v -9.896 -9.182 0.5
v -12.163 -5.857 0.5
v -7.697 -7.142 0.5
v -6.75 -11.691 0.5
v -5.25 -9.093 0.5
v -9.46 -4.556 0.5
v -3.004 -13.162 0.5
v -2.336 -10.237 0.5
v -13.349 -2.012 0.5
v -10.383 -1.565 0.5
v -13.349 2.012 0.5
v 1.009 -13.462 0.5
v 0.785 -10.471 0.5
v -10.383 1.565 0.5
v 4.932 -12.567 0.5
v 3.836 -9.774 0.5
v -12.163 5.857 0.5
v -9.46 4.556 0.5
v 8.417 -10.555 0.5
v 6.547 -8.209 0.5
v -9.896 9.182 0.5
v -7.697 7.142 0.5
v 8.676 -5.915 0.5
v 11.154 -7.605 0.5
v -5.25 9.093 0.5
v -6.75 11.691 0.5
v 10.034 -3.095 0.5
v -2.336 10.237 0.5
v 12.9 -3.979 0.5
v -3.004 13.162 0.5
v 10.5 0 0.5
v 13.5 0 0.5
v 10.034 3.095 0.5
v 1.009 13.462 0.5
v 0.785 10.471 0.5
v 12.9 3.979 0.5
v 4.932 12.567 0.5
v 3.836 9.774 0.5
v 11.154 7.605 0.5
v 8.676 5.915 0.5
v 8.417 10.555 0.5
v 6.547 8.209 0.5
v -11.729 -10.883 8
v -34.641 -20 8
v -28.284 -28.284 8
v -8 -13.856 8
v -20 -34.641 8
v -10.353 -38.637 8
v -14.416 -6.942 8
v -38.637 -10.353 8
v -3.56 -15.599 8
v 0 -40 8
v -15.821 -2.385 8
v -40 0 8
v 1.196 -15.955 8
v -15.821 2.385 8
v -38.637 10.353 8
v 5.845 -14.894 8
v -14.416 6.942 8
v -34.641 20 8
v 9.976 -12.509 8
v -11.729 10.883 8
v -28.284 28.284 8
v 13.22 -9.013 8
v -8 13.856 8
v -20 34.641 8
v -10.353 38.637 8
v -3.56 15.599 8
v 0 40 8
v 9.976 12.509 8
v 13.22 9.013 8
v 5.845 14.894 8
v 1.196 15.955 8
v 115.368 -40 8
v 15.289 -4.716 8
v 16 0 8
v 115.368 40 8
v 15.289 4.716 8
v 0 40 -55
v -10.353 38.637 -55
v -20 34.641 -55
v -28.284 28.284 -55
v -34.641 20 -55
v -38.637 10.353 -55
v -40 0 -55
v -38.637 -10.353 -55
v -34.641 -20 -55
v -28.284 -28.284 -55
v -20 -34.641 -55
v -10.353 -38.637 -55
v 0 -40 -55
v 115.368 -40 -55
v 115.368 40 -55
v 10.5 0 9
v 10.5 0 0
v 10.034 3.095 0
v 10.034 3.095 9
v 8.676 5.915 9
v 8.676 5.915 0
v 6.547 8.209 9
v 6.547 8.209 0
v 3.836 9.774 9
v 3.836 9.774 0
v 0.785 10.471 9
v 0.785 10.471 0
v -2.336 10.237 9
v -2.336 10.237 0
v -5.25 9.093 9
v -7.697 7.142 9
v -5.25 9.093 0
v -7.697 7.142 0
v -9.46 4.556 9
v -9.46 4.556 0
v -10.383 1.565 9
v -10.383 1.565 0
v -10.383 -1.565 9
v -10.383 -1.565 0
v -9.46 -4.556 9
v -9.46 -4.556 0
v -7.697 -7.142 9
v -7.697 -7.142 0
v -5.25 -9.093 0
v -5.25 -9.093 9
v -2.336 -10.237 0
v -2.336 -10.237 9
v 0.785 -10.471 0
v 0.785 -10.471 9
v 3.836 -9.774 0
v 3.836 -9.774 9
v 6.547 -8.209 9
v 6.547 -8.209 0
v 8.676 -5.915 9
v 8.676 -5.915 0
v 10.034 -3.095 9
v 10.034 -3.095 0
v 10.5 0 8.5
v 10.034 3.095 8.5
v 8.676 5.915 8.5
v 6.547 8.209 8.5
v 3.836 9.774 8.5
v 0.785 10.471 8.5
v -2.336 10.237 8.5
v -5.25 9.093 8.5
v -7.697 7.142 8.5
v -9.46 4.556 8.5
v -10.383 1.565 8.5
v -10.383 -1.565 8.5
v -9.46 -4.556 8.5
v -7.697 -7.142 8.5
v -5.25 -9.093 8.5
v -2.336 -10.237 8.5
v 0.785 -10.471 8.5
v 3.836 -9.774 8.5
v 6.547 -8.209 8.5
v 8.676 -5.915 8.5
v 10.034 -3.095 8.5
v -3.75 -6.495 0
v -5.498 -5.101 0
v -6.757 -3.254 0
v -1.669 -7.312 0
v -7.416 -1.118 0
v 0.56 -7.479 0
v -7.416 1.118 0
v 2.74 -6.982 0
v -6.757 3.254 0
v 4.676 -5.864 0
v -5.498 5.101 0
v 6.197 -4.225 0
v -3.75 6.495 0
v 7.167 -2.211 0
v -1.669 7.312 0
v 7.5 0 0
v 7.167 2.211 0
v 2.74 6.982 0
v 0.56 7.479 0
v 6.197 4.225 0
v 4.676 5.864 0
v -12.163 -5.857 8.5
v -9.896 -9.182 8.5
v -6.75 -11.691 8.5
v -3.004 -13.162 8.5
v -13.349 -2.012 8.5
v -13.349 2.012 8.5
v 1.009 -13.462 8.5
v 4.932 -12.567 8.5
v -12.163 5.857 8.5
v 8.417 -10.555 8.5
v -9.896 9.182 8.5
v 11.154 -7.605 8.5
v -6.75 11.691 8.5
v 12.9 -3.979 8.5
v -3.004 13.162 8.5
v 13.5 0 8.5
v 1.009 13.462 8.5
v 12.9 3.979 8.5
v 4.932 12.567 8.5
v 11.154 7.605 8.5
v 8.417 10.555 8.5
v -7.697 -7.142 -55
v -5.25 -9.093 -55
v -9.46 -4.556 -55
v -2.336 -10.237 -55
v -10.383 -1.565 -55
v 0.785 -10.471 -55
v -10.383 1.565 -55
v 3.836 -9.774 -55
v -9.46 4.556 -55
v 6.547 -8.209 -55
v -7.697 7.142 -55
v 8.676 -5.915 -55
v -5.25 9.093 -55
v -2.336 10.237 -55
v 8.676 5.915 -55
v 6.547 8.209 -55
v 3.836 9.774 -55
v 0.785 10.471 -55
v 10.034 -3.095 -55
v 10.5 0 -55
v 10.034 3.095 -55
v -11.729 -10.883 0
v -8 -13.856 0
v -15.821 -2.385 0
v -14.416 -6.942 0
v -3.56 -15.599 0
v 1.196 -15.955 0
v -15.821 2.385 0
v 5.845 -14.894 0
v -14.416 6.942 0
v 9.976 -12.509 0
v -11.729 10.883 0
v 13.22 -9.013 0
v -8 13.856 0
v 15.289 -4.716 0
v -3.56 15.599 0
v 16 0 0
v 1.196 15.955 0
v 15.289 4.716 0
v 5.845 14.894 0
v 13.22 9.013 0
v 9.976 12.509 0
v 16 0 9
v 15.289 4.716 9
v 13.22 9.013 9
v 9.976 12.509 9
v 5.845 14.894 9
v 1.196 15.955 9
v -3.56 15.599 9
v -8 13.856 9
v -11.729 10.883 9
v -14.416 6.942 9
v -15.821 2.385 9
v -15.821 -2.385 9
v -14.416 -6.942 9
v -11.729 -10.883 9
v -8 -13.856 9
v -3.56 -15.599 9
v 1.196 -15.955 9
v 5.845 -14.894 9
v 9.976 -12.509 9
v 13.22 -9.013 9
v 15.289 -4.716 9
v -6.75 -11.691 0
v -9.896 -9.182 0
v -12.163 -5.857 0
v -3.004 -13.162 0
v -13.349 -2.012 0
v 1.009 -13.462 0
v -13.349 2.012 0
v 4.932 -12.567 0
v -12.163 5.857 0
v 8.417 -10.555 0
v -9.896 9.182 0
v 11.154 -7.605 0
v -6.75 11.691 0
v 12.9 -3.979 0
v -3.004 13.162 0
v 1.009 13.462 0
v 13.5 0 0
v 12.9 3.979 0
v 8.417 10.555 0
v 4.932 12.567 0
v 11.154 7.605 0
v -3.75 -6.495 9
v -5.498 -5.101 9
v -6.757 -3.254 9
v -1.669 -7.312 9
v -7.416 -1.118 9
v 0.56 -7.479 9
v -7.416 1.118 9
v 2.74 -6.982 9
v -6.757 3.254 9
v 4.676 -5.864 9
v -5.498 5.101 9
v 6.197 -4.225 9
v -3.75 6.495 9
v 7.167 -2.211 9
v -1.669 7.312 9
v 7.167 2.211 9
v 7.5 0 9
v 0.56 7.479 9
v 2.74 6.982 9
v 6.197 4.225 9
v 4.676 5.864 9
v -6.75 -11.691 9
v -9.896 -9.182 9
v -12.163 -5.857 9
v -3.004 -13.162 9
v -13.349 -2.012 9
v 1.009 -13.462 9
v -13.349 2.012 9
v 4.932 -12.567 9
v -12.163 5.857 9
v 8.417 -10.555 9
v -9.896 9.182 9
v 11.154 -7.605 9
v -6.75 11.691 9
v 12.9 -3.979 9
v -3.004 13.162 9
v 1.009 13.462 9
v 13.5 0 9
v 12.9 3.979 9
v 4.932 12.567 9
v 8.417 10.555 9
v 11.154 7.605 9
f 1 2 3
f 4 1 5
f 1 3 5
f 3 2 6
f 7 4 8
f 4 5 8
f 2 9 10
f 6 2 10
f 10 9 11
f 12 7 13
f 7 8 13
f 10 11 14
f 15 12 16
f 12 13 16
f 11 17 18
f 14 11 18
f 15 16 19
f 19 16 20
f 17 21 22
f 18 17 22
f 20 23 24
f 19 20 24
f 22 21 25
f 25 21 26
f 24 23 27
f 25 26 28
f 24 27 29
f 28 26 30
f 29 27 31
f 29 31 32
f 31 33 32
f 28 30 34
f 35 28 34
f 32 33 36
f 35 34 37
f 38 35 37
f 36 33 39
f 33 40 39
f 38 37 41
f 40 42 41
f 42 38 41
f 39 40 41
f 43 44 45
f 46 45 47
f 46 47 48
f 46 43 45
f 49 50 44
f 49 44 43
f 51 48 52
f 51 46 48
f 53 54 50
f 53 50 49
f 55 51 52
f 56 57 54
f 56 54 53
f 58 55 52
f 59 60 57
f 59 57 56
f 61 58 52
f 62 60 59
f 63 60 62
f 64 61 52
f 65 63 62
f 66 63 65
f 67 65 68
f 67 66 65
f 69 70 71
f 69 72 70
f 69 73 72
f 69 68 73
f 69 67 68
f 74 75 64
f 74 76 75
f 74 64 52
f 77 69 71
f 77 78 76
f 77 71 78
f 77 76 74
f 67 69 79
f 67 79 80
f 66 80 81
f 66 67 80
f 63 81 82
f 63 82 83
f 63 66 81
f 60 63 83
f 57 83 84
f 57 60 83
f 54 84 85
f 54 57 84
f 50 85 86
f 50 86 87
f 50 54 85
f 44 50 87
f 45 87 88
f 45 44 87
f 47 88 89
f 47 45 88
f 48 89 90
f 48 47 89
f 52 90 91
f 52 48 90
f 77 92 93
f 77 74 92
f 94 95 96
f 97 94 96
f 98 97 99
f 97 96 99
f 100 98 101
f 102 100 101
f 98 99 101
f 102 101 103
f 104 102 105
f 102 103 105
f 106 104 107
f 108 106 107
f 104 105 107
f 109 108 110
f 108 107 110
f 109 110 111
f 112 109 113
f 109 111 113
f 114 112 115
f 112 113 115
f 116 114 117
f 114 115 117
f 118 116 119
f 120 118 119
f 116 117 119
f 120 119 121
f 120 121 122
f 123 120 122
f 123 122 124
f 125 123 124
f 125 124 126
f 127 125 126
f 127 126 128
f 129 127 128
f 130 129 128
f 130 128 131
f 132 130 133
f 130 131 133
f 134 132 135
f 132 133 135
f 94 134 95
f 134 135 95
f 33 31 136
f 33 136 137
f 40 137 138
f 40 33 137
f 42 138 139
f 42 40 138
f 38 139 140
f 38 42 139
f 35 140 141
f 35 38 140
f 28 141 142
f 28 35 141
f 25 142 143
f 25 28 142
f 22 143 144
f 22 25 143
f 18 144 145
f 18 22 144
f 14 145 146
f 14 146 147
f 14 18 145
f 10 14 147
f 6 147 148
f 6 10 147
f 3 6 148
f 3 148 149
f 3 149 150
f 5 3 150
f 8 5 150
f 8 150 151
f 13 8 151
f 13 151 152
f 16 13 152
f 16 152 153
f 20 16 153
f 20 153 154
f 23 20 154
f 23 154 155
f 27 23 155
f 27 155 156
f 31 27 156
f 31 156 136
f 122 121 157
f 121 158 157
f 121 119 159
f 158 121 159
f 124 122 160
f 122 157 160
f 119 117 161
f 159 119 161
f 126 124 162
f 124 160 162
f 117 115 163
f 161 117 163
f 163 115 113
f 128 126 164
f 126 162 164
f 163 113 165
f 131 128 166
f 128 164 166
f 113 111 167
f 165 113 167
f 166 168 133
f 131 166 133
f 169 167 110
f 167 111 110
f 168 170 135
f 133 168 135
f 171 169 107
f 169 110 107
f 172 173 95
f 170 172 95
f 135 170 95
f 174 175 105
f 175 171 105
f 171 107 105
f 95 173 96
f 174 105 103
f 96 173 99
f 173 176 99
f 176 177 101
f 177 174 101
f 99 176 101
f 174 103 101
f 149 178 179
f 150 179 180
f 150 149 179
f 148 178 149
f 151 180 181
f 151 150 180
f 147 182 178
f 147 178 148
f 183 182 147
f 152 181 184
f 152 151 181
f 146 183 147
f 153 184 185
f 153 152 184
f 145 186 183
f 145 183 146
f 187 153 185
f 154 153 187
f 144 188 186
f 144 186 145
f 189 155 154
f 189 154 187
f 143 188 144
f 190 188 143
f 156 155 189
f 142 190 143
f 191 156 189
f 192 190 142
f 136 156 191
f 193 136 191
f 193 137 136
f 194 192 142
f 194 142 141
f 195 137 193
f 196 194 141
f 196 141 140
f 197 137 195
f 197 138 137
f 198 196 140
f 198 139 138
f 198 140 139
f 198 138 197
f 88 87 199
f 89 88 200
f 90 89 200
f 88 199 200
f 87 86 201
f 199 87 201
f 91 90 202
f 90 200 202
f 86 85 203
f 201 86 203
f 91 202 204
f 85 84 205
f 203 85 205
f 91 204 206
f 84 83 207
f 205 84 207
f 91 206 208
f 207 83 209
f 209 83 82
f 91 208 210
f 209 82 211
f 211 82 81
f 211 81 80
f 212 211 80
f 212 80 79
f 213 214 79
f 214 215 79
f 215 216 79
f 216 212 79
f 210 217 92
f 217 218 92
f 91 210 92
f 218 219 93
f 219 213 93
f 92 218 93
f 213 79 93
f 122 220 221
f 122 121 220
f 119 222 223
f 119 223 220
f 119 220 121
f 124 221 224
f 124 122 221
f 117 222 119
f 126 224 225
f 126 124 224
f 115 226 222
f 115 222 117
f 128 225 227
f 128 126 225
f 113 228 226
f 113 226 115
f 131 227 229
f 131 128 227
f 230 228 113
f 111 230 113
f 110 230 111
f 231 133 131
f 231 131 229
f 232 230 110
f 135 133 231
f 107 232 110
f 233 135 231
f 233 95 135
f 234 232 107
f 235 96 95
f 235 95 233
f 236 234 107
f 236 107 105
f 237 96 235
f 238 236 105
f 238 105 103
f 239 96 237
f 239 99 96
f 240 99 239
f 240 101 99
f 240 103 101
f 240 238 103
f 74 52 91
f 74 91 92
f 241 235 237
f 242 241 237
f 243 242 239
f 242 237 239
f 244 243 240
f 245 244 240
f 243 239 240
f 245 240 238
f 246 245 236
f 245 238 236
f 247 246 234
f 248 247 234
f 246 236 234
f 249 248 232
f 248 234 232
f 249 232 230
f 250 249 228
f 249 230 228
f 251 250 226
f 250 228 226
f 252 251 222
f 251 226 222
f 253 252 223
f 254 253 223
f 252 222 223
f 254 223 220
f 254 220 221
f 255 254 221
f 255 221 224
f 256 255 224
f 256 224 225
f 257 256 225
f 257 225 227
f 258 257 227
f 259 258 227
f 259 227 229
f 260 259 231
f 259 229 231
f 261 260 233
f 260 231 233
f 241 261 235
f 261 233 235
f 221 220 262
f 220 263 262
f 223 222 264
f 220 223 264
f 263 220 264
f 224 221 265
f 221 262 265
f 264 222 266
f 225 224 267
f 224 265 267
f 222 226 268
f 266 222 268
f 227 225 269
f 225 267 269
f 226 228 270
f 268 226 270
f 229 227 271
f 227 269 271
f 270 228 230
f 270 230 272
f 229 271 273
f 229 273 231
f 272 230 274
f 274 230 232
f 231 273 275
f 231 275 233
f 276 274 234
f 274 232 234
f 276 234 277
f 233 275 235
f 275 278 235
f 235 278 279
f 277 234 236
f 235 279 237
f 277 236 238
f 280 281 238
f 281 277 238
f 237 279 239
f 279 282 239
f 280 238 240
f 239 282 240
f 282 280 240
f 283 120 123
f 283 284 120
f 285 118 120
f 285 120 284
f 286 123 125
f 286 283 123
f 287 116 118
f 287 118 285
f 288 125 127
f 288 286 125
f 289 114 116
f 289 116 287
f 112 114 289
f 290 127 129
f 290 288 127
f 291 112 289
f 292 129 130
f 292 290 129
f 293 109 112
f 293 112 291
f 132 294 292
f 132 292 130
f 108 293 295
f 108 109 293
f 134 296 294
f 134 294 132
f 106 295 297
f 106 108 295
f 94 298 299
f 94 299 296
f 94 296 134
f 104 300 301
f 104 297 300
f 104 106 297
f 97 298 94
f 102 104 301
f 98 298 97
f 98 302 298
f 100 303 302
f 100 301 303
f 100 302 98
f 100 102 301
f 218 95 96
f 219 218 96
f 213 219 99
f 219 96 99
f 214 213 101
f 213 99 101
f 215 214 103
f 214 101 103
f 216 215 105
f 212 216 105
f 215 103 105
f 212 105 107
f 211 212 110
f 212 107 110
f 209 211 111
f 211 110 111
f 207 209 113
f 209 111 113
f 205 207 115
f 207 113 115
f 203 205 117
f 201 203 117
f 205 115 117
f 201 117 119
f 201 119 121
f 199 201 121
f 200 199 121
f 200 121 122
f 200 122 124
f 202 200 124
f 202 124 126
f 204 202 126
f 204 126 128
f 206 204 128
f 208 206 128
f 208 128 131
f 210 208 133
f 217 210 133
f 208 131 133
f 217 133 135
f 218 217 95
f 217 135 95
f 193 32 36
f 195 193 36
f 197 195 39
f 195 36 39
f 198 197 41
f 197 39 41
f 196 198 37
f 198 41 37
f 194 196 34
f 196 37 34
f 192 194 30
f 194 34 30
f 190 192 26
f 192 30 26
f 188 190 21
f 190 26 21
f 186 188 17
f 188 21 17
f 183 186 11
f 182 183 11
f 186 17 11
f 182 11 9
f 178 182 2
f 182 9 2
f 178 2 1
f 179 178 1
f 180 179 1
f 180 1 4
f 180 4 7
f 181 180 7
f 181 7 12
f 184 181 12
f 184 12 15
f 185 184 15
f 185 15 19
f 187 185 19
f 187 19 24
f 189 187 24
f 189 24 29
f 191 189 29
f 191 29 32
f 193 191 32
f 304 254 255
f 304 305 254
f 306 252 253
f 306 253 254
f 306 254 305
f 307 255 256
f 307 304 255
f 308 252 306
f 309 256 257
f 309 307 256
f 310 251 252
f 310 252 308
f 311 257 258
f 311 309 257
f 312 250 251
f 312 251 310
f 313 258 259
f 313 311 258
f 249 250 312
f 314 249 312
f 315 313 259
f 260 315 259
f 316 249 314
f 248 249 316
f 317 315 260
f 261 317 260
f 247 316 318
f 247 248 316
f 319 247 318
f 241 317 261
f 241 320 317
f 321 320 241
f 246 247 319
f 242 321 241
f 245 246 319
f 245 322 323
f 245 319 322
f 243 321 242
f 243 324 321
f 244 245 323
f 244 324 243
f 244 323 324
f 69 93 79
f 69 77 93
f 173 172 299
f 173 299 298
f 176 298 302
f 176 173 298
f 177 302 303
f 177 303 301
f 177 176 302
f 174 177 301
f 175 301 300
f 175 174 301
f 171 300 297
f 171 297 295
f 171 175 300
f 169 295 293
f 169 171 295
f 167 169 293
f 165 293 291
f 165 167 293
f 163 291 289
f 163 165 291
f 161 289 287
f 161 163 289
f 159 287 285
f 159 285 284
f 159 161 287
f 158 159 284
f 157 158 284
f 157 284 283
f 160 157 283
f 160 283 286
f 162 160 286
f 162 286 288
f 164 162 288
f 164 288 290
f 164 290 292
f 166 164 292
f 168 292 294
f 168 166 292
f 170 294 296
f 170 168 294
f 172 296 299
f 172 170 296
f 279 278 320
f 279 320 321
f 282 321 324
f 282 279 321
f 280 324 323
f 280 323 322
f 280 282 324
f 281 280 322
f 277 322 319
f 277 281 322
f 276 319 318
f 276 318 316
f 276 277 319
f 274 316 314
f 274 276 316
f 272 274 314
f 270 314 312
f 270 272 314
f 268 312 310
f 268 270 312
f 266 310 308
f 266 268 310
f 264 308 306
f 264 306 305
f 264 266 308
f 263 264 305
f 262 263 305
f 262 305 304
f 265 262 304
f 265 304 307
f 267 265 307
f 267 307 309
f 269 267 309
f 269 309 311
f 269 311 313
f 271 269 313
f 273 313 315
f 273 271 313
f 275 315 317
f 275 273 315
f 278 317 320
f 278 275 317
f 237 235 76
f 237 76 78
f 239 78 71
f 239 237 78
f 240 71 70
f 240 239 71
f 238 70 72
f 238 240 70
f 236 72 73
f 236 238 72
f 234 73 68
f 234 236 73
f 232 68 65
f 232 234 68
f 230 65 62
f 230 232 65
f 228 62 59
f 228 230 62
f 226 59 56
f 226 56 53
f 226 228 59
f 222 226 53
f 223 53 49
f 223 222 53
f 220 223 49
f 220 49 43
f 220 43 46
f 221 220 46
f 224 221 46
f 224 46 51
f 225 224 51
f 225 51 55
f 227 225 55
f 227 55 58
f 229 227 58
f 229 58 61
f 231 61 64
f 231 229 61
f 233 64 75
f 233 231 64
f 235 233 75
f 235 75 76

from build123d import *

# Parameters (mm, degrees)
F0_R     = 16
F0_R_2   = 13.5
F1_DEPTH = 9
F0_R_3   = 10.5
F0_R_4   = 7.5
F2_DEPTH = 8.5
F3_DEPTH = 0.5
F4_R     = 16
F5_DEPTH = 8
F4_R_2   = 10.5
F6_DEPTH = 55


with BuildPart() as f1:
    # F0 (on Top) → F1 (new body)
    with BuildSketch(Plane.XY):
        Circle(F0_R)
        Circle(F0_R_2, mode=Mode.SUBTRACT)
    extrude(amount=F1_DEPTH)


with BuildPart() as f1b:
    # F0 (on Top) → F1, piece 2 (new body)
    with BuildSketch(Plane.XY):
        Circle(F0_R_3)
        Circle(F0_R_4, mode=Mode.SUBTRACT)
    extrude(amount=F1_DEPTH)


with BuildPart() as f2:
    # F0 (on Top) → F2 (new body)
    with BuildSketch(Plane.XY):
        Circle(F0_R_2)
        Circle(F0_R_3, mode=Mode.SUBTRACT)
    extrude(amount=F2_DEPTH)

    # F3 (cut): a face of the model
    f3_faces = [f2.faces().sort_by_distance(p)[0] for p in [
        (-13.1181623382, 0, 0),
    ]]
    extrude(f3_faces, amount=-F3_DEPTH, mode=Mode.SUBTRACT)


with BuildPart() as f5:
    # F4 (on Top) → F5 (new body)
    with BuildSketch(Plane.XY):
        with BuildLine():
            Line((115.3682768345, 40), (0, 40))
            ThreePointArc((0, 40), (-40, 0), (0, -40))
            Line((0, -40), (115.3682768345, -40))
            Line((115.3682768345, -40), (115.3682768345, 40))
        make_face()
        Circle(F4_R, mode=Mode.SUBTRACT)
    extrude(amount=F5_DEPTH)

    # F4 (on Top) → F6 (join)
    with BuildSketch(Plane.XY):
        with BuildLine():
            Line((115.3682768345, 40), (0, 40))
            ThreePointArc((0, 40), (-40, 0), (0, -40))
            Line((0, -40), (115.3682768345, -40))
            Line((115.3682768345, -40), (115.3682768345, 40))
        make_face()
        Circle(F4_R, mode=Mode.SUBTRACT)
        Circle(F4_R)
        Circle(F4_R_2, mode=Mode.SUBTRACT)
    extrude(amount=-F6_DEPTH)


solid = Compound([f1.part, f1b.part, f2.part, f5.part])
